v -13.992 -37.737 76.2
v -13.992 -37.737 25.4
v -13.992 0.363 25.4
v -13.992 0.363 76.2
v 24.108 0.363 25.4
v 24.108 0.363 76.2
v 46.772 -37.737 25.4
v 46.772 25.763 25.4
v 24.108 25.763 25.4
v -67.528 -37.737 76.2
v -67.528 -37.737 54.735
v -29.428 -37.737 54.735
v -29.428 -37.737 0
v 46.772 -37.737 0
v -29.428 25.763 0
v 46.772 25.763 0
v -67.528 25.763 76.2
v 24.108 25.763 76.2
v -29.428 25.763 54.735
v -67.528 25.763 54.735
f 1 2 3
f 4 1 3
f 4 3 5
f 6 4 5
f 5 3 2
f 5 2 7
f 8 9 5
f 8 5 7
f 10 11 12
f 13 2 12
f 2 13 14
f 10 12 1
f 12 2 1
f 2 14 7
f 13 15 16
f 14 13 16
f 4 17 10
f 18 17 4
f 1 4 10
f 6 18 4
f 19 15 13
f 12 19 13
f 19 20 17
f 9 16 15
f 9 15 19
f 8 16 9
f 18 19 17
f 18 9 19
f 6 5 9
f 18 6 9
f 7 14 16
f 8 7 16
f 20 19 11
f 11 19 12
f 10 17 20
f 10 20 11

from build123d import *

# Parameters (mm, degrees)
F0_W     = 76.2
F0_H     = 63.5
F1_DEPTH = 25.4
F3_DEPTH = 50.8
F4_W     = 63.5
F4_H     = 21.465122
F5_DEPTH = 38.1


with BuildPart() as f1:
    # F0 (on Top) → F1 (new body)
    with BuildSketch(Plane.XY):
        with Locations((8.671692, -5.987014)):
            Rectangle(F0_W, F0_H)
    extrude(amount=F1_DEPTH)

    # F2 (on face) → F3 (join)
    with BuildSketch(Plane.XY.offset(25.4)):
        Polygon((-29.428308, -37.737014), (-13.991789, -37.737014), (-13.991789, 0.362986), (24.108211, 0.362986), (24.108211, 25.762986), (-29.428308, 25.762986), align=None)
    extrude(amount=F3_DEPTH)

    # F4 (on face) → F5 (join)
    with BuildSketch(Plane(origin=(-29.428308, 0, 0), x_dir=(0, -1, 0), z_dir=(-1, 0, 0))):
        with Locations((5.987014, 65.467439)):
            Rectangle(F4_W, F4_H)
    extrude(amount=F5_DEPTH)


solid = f1.part
